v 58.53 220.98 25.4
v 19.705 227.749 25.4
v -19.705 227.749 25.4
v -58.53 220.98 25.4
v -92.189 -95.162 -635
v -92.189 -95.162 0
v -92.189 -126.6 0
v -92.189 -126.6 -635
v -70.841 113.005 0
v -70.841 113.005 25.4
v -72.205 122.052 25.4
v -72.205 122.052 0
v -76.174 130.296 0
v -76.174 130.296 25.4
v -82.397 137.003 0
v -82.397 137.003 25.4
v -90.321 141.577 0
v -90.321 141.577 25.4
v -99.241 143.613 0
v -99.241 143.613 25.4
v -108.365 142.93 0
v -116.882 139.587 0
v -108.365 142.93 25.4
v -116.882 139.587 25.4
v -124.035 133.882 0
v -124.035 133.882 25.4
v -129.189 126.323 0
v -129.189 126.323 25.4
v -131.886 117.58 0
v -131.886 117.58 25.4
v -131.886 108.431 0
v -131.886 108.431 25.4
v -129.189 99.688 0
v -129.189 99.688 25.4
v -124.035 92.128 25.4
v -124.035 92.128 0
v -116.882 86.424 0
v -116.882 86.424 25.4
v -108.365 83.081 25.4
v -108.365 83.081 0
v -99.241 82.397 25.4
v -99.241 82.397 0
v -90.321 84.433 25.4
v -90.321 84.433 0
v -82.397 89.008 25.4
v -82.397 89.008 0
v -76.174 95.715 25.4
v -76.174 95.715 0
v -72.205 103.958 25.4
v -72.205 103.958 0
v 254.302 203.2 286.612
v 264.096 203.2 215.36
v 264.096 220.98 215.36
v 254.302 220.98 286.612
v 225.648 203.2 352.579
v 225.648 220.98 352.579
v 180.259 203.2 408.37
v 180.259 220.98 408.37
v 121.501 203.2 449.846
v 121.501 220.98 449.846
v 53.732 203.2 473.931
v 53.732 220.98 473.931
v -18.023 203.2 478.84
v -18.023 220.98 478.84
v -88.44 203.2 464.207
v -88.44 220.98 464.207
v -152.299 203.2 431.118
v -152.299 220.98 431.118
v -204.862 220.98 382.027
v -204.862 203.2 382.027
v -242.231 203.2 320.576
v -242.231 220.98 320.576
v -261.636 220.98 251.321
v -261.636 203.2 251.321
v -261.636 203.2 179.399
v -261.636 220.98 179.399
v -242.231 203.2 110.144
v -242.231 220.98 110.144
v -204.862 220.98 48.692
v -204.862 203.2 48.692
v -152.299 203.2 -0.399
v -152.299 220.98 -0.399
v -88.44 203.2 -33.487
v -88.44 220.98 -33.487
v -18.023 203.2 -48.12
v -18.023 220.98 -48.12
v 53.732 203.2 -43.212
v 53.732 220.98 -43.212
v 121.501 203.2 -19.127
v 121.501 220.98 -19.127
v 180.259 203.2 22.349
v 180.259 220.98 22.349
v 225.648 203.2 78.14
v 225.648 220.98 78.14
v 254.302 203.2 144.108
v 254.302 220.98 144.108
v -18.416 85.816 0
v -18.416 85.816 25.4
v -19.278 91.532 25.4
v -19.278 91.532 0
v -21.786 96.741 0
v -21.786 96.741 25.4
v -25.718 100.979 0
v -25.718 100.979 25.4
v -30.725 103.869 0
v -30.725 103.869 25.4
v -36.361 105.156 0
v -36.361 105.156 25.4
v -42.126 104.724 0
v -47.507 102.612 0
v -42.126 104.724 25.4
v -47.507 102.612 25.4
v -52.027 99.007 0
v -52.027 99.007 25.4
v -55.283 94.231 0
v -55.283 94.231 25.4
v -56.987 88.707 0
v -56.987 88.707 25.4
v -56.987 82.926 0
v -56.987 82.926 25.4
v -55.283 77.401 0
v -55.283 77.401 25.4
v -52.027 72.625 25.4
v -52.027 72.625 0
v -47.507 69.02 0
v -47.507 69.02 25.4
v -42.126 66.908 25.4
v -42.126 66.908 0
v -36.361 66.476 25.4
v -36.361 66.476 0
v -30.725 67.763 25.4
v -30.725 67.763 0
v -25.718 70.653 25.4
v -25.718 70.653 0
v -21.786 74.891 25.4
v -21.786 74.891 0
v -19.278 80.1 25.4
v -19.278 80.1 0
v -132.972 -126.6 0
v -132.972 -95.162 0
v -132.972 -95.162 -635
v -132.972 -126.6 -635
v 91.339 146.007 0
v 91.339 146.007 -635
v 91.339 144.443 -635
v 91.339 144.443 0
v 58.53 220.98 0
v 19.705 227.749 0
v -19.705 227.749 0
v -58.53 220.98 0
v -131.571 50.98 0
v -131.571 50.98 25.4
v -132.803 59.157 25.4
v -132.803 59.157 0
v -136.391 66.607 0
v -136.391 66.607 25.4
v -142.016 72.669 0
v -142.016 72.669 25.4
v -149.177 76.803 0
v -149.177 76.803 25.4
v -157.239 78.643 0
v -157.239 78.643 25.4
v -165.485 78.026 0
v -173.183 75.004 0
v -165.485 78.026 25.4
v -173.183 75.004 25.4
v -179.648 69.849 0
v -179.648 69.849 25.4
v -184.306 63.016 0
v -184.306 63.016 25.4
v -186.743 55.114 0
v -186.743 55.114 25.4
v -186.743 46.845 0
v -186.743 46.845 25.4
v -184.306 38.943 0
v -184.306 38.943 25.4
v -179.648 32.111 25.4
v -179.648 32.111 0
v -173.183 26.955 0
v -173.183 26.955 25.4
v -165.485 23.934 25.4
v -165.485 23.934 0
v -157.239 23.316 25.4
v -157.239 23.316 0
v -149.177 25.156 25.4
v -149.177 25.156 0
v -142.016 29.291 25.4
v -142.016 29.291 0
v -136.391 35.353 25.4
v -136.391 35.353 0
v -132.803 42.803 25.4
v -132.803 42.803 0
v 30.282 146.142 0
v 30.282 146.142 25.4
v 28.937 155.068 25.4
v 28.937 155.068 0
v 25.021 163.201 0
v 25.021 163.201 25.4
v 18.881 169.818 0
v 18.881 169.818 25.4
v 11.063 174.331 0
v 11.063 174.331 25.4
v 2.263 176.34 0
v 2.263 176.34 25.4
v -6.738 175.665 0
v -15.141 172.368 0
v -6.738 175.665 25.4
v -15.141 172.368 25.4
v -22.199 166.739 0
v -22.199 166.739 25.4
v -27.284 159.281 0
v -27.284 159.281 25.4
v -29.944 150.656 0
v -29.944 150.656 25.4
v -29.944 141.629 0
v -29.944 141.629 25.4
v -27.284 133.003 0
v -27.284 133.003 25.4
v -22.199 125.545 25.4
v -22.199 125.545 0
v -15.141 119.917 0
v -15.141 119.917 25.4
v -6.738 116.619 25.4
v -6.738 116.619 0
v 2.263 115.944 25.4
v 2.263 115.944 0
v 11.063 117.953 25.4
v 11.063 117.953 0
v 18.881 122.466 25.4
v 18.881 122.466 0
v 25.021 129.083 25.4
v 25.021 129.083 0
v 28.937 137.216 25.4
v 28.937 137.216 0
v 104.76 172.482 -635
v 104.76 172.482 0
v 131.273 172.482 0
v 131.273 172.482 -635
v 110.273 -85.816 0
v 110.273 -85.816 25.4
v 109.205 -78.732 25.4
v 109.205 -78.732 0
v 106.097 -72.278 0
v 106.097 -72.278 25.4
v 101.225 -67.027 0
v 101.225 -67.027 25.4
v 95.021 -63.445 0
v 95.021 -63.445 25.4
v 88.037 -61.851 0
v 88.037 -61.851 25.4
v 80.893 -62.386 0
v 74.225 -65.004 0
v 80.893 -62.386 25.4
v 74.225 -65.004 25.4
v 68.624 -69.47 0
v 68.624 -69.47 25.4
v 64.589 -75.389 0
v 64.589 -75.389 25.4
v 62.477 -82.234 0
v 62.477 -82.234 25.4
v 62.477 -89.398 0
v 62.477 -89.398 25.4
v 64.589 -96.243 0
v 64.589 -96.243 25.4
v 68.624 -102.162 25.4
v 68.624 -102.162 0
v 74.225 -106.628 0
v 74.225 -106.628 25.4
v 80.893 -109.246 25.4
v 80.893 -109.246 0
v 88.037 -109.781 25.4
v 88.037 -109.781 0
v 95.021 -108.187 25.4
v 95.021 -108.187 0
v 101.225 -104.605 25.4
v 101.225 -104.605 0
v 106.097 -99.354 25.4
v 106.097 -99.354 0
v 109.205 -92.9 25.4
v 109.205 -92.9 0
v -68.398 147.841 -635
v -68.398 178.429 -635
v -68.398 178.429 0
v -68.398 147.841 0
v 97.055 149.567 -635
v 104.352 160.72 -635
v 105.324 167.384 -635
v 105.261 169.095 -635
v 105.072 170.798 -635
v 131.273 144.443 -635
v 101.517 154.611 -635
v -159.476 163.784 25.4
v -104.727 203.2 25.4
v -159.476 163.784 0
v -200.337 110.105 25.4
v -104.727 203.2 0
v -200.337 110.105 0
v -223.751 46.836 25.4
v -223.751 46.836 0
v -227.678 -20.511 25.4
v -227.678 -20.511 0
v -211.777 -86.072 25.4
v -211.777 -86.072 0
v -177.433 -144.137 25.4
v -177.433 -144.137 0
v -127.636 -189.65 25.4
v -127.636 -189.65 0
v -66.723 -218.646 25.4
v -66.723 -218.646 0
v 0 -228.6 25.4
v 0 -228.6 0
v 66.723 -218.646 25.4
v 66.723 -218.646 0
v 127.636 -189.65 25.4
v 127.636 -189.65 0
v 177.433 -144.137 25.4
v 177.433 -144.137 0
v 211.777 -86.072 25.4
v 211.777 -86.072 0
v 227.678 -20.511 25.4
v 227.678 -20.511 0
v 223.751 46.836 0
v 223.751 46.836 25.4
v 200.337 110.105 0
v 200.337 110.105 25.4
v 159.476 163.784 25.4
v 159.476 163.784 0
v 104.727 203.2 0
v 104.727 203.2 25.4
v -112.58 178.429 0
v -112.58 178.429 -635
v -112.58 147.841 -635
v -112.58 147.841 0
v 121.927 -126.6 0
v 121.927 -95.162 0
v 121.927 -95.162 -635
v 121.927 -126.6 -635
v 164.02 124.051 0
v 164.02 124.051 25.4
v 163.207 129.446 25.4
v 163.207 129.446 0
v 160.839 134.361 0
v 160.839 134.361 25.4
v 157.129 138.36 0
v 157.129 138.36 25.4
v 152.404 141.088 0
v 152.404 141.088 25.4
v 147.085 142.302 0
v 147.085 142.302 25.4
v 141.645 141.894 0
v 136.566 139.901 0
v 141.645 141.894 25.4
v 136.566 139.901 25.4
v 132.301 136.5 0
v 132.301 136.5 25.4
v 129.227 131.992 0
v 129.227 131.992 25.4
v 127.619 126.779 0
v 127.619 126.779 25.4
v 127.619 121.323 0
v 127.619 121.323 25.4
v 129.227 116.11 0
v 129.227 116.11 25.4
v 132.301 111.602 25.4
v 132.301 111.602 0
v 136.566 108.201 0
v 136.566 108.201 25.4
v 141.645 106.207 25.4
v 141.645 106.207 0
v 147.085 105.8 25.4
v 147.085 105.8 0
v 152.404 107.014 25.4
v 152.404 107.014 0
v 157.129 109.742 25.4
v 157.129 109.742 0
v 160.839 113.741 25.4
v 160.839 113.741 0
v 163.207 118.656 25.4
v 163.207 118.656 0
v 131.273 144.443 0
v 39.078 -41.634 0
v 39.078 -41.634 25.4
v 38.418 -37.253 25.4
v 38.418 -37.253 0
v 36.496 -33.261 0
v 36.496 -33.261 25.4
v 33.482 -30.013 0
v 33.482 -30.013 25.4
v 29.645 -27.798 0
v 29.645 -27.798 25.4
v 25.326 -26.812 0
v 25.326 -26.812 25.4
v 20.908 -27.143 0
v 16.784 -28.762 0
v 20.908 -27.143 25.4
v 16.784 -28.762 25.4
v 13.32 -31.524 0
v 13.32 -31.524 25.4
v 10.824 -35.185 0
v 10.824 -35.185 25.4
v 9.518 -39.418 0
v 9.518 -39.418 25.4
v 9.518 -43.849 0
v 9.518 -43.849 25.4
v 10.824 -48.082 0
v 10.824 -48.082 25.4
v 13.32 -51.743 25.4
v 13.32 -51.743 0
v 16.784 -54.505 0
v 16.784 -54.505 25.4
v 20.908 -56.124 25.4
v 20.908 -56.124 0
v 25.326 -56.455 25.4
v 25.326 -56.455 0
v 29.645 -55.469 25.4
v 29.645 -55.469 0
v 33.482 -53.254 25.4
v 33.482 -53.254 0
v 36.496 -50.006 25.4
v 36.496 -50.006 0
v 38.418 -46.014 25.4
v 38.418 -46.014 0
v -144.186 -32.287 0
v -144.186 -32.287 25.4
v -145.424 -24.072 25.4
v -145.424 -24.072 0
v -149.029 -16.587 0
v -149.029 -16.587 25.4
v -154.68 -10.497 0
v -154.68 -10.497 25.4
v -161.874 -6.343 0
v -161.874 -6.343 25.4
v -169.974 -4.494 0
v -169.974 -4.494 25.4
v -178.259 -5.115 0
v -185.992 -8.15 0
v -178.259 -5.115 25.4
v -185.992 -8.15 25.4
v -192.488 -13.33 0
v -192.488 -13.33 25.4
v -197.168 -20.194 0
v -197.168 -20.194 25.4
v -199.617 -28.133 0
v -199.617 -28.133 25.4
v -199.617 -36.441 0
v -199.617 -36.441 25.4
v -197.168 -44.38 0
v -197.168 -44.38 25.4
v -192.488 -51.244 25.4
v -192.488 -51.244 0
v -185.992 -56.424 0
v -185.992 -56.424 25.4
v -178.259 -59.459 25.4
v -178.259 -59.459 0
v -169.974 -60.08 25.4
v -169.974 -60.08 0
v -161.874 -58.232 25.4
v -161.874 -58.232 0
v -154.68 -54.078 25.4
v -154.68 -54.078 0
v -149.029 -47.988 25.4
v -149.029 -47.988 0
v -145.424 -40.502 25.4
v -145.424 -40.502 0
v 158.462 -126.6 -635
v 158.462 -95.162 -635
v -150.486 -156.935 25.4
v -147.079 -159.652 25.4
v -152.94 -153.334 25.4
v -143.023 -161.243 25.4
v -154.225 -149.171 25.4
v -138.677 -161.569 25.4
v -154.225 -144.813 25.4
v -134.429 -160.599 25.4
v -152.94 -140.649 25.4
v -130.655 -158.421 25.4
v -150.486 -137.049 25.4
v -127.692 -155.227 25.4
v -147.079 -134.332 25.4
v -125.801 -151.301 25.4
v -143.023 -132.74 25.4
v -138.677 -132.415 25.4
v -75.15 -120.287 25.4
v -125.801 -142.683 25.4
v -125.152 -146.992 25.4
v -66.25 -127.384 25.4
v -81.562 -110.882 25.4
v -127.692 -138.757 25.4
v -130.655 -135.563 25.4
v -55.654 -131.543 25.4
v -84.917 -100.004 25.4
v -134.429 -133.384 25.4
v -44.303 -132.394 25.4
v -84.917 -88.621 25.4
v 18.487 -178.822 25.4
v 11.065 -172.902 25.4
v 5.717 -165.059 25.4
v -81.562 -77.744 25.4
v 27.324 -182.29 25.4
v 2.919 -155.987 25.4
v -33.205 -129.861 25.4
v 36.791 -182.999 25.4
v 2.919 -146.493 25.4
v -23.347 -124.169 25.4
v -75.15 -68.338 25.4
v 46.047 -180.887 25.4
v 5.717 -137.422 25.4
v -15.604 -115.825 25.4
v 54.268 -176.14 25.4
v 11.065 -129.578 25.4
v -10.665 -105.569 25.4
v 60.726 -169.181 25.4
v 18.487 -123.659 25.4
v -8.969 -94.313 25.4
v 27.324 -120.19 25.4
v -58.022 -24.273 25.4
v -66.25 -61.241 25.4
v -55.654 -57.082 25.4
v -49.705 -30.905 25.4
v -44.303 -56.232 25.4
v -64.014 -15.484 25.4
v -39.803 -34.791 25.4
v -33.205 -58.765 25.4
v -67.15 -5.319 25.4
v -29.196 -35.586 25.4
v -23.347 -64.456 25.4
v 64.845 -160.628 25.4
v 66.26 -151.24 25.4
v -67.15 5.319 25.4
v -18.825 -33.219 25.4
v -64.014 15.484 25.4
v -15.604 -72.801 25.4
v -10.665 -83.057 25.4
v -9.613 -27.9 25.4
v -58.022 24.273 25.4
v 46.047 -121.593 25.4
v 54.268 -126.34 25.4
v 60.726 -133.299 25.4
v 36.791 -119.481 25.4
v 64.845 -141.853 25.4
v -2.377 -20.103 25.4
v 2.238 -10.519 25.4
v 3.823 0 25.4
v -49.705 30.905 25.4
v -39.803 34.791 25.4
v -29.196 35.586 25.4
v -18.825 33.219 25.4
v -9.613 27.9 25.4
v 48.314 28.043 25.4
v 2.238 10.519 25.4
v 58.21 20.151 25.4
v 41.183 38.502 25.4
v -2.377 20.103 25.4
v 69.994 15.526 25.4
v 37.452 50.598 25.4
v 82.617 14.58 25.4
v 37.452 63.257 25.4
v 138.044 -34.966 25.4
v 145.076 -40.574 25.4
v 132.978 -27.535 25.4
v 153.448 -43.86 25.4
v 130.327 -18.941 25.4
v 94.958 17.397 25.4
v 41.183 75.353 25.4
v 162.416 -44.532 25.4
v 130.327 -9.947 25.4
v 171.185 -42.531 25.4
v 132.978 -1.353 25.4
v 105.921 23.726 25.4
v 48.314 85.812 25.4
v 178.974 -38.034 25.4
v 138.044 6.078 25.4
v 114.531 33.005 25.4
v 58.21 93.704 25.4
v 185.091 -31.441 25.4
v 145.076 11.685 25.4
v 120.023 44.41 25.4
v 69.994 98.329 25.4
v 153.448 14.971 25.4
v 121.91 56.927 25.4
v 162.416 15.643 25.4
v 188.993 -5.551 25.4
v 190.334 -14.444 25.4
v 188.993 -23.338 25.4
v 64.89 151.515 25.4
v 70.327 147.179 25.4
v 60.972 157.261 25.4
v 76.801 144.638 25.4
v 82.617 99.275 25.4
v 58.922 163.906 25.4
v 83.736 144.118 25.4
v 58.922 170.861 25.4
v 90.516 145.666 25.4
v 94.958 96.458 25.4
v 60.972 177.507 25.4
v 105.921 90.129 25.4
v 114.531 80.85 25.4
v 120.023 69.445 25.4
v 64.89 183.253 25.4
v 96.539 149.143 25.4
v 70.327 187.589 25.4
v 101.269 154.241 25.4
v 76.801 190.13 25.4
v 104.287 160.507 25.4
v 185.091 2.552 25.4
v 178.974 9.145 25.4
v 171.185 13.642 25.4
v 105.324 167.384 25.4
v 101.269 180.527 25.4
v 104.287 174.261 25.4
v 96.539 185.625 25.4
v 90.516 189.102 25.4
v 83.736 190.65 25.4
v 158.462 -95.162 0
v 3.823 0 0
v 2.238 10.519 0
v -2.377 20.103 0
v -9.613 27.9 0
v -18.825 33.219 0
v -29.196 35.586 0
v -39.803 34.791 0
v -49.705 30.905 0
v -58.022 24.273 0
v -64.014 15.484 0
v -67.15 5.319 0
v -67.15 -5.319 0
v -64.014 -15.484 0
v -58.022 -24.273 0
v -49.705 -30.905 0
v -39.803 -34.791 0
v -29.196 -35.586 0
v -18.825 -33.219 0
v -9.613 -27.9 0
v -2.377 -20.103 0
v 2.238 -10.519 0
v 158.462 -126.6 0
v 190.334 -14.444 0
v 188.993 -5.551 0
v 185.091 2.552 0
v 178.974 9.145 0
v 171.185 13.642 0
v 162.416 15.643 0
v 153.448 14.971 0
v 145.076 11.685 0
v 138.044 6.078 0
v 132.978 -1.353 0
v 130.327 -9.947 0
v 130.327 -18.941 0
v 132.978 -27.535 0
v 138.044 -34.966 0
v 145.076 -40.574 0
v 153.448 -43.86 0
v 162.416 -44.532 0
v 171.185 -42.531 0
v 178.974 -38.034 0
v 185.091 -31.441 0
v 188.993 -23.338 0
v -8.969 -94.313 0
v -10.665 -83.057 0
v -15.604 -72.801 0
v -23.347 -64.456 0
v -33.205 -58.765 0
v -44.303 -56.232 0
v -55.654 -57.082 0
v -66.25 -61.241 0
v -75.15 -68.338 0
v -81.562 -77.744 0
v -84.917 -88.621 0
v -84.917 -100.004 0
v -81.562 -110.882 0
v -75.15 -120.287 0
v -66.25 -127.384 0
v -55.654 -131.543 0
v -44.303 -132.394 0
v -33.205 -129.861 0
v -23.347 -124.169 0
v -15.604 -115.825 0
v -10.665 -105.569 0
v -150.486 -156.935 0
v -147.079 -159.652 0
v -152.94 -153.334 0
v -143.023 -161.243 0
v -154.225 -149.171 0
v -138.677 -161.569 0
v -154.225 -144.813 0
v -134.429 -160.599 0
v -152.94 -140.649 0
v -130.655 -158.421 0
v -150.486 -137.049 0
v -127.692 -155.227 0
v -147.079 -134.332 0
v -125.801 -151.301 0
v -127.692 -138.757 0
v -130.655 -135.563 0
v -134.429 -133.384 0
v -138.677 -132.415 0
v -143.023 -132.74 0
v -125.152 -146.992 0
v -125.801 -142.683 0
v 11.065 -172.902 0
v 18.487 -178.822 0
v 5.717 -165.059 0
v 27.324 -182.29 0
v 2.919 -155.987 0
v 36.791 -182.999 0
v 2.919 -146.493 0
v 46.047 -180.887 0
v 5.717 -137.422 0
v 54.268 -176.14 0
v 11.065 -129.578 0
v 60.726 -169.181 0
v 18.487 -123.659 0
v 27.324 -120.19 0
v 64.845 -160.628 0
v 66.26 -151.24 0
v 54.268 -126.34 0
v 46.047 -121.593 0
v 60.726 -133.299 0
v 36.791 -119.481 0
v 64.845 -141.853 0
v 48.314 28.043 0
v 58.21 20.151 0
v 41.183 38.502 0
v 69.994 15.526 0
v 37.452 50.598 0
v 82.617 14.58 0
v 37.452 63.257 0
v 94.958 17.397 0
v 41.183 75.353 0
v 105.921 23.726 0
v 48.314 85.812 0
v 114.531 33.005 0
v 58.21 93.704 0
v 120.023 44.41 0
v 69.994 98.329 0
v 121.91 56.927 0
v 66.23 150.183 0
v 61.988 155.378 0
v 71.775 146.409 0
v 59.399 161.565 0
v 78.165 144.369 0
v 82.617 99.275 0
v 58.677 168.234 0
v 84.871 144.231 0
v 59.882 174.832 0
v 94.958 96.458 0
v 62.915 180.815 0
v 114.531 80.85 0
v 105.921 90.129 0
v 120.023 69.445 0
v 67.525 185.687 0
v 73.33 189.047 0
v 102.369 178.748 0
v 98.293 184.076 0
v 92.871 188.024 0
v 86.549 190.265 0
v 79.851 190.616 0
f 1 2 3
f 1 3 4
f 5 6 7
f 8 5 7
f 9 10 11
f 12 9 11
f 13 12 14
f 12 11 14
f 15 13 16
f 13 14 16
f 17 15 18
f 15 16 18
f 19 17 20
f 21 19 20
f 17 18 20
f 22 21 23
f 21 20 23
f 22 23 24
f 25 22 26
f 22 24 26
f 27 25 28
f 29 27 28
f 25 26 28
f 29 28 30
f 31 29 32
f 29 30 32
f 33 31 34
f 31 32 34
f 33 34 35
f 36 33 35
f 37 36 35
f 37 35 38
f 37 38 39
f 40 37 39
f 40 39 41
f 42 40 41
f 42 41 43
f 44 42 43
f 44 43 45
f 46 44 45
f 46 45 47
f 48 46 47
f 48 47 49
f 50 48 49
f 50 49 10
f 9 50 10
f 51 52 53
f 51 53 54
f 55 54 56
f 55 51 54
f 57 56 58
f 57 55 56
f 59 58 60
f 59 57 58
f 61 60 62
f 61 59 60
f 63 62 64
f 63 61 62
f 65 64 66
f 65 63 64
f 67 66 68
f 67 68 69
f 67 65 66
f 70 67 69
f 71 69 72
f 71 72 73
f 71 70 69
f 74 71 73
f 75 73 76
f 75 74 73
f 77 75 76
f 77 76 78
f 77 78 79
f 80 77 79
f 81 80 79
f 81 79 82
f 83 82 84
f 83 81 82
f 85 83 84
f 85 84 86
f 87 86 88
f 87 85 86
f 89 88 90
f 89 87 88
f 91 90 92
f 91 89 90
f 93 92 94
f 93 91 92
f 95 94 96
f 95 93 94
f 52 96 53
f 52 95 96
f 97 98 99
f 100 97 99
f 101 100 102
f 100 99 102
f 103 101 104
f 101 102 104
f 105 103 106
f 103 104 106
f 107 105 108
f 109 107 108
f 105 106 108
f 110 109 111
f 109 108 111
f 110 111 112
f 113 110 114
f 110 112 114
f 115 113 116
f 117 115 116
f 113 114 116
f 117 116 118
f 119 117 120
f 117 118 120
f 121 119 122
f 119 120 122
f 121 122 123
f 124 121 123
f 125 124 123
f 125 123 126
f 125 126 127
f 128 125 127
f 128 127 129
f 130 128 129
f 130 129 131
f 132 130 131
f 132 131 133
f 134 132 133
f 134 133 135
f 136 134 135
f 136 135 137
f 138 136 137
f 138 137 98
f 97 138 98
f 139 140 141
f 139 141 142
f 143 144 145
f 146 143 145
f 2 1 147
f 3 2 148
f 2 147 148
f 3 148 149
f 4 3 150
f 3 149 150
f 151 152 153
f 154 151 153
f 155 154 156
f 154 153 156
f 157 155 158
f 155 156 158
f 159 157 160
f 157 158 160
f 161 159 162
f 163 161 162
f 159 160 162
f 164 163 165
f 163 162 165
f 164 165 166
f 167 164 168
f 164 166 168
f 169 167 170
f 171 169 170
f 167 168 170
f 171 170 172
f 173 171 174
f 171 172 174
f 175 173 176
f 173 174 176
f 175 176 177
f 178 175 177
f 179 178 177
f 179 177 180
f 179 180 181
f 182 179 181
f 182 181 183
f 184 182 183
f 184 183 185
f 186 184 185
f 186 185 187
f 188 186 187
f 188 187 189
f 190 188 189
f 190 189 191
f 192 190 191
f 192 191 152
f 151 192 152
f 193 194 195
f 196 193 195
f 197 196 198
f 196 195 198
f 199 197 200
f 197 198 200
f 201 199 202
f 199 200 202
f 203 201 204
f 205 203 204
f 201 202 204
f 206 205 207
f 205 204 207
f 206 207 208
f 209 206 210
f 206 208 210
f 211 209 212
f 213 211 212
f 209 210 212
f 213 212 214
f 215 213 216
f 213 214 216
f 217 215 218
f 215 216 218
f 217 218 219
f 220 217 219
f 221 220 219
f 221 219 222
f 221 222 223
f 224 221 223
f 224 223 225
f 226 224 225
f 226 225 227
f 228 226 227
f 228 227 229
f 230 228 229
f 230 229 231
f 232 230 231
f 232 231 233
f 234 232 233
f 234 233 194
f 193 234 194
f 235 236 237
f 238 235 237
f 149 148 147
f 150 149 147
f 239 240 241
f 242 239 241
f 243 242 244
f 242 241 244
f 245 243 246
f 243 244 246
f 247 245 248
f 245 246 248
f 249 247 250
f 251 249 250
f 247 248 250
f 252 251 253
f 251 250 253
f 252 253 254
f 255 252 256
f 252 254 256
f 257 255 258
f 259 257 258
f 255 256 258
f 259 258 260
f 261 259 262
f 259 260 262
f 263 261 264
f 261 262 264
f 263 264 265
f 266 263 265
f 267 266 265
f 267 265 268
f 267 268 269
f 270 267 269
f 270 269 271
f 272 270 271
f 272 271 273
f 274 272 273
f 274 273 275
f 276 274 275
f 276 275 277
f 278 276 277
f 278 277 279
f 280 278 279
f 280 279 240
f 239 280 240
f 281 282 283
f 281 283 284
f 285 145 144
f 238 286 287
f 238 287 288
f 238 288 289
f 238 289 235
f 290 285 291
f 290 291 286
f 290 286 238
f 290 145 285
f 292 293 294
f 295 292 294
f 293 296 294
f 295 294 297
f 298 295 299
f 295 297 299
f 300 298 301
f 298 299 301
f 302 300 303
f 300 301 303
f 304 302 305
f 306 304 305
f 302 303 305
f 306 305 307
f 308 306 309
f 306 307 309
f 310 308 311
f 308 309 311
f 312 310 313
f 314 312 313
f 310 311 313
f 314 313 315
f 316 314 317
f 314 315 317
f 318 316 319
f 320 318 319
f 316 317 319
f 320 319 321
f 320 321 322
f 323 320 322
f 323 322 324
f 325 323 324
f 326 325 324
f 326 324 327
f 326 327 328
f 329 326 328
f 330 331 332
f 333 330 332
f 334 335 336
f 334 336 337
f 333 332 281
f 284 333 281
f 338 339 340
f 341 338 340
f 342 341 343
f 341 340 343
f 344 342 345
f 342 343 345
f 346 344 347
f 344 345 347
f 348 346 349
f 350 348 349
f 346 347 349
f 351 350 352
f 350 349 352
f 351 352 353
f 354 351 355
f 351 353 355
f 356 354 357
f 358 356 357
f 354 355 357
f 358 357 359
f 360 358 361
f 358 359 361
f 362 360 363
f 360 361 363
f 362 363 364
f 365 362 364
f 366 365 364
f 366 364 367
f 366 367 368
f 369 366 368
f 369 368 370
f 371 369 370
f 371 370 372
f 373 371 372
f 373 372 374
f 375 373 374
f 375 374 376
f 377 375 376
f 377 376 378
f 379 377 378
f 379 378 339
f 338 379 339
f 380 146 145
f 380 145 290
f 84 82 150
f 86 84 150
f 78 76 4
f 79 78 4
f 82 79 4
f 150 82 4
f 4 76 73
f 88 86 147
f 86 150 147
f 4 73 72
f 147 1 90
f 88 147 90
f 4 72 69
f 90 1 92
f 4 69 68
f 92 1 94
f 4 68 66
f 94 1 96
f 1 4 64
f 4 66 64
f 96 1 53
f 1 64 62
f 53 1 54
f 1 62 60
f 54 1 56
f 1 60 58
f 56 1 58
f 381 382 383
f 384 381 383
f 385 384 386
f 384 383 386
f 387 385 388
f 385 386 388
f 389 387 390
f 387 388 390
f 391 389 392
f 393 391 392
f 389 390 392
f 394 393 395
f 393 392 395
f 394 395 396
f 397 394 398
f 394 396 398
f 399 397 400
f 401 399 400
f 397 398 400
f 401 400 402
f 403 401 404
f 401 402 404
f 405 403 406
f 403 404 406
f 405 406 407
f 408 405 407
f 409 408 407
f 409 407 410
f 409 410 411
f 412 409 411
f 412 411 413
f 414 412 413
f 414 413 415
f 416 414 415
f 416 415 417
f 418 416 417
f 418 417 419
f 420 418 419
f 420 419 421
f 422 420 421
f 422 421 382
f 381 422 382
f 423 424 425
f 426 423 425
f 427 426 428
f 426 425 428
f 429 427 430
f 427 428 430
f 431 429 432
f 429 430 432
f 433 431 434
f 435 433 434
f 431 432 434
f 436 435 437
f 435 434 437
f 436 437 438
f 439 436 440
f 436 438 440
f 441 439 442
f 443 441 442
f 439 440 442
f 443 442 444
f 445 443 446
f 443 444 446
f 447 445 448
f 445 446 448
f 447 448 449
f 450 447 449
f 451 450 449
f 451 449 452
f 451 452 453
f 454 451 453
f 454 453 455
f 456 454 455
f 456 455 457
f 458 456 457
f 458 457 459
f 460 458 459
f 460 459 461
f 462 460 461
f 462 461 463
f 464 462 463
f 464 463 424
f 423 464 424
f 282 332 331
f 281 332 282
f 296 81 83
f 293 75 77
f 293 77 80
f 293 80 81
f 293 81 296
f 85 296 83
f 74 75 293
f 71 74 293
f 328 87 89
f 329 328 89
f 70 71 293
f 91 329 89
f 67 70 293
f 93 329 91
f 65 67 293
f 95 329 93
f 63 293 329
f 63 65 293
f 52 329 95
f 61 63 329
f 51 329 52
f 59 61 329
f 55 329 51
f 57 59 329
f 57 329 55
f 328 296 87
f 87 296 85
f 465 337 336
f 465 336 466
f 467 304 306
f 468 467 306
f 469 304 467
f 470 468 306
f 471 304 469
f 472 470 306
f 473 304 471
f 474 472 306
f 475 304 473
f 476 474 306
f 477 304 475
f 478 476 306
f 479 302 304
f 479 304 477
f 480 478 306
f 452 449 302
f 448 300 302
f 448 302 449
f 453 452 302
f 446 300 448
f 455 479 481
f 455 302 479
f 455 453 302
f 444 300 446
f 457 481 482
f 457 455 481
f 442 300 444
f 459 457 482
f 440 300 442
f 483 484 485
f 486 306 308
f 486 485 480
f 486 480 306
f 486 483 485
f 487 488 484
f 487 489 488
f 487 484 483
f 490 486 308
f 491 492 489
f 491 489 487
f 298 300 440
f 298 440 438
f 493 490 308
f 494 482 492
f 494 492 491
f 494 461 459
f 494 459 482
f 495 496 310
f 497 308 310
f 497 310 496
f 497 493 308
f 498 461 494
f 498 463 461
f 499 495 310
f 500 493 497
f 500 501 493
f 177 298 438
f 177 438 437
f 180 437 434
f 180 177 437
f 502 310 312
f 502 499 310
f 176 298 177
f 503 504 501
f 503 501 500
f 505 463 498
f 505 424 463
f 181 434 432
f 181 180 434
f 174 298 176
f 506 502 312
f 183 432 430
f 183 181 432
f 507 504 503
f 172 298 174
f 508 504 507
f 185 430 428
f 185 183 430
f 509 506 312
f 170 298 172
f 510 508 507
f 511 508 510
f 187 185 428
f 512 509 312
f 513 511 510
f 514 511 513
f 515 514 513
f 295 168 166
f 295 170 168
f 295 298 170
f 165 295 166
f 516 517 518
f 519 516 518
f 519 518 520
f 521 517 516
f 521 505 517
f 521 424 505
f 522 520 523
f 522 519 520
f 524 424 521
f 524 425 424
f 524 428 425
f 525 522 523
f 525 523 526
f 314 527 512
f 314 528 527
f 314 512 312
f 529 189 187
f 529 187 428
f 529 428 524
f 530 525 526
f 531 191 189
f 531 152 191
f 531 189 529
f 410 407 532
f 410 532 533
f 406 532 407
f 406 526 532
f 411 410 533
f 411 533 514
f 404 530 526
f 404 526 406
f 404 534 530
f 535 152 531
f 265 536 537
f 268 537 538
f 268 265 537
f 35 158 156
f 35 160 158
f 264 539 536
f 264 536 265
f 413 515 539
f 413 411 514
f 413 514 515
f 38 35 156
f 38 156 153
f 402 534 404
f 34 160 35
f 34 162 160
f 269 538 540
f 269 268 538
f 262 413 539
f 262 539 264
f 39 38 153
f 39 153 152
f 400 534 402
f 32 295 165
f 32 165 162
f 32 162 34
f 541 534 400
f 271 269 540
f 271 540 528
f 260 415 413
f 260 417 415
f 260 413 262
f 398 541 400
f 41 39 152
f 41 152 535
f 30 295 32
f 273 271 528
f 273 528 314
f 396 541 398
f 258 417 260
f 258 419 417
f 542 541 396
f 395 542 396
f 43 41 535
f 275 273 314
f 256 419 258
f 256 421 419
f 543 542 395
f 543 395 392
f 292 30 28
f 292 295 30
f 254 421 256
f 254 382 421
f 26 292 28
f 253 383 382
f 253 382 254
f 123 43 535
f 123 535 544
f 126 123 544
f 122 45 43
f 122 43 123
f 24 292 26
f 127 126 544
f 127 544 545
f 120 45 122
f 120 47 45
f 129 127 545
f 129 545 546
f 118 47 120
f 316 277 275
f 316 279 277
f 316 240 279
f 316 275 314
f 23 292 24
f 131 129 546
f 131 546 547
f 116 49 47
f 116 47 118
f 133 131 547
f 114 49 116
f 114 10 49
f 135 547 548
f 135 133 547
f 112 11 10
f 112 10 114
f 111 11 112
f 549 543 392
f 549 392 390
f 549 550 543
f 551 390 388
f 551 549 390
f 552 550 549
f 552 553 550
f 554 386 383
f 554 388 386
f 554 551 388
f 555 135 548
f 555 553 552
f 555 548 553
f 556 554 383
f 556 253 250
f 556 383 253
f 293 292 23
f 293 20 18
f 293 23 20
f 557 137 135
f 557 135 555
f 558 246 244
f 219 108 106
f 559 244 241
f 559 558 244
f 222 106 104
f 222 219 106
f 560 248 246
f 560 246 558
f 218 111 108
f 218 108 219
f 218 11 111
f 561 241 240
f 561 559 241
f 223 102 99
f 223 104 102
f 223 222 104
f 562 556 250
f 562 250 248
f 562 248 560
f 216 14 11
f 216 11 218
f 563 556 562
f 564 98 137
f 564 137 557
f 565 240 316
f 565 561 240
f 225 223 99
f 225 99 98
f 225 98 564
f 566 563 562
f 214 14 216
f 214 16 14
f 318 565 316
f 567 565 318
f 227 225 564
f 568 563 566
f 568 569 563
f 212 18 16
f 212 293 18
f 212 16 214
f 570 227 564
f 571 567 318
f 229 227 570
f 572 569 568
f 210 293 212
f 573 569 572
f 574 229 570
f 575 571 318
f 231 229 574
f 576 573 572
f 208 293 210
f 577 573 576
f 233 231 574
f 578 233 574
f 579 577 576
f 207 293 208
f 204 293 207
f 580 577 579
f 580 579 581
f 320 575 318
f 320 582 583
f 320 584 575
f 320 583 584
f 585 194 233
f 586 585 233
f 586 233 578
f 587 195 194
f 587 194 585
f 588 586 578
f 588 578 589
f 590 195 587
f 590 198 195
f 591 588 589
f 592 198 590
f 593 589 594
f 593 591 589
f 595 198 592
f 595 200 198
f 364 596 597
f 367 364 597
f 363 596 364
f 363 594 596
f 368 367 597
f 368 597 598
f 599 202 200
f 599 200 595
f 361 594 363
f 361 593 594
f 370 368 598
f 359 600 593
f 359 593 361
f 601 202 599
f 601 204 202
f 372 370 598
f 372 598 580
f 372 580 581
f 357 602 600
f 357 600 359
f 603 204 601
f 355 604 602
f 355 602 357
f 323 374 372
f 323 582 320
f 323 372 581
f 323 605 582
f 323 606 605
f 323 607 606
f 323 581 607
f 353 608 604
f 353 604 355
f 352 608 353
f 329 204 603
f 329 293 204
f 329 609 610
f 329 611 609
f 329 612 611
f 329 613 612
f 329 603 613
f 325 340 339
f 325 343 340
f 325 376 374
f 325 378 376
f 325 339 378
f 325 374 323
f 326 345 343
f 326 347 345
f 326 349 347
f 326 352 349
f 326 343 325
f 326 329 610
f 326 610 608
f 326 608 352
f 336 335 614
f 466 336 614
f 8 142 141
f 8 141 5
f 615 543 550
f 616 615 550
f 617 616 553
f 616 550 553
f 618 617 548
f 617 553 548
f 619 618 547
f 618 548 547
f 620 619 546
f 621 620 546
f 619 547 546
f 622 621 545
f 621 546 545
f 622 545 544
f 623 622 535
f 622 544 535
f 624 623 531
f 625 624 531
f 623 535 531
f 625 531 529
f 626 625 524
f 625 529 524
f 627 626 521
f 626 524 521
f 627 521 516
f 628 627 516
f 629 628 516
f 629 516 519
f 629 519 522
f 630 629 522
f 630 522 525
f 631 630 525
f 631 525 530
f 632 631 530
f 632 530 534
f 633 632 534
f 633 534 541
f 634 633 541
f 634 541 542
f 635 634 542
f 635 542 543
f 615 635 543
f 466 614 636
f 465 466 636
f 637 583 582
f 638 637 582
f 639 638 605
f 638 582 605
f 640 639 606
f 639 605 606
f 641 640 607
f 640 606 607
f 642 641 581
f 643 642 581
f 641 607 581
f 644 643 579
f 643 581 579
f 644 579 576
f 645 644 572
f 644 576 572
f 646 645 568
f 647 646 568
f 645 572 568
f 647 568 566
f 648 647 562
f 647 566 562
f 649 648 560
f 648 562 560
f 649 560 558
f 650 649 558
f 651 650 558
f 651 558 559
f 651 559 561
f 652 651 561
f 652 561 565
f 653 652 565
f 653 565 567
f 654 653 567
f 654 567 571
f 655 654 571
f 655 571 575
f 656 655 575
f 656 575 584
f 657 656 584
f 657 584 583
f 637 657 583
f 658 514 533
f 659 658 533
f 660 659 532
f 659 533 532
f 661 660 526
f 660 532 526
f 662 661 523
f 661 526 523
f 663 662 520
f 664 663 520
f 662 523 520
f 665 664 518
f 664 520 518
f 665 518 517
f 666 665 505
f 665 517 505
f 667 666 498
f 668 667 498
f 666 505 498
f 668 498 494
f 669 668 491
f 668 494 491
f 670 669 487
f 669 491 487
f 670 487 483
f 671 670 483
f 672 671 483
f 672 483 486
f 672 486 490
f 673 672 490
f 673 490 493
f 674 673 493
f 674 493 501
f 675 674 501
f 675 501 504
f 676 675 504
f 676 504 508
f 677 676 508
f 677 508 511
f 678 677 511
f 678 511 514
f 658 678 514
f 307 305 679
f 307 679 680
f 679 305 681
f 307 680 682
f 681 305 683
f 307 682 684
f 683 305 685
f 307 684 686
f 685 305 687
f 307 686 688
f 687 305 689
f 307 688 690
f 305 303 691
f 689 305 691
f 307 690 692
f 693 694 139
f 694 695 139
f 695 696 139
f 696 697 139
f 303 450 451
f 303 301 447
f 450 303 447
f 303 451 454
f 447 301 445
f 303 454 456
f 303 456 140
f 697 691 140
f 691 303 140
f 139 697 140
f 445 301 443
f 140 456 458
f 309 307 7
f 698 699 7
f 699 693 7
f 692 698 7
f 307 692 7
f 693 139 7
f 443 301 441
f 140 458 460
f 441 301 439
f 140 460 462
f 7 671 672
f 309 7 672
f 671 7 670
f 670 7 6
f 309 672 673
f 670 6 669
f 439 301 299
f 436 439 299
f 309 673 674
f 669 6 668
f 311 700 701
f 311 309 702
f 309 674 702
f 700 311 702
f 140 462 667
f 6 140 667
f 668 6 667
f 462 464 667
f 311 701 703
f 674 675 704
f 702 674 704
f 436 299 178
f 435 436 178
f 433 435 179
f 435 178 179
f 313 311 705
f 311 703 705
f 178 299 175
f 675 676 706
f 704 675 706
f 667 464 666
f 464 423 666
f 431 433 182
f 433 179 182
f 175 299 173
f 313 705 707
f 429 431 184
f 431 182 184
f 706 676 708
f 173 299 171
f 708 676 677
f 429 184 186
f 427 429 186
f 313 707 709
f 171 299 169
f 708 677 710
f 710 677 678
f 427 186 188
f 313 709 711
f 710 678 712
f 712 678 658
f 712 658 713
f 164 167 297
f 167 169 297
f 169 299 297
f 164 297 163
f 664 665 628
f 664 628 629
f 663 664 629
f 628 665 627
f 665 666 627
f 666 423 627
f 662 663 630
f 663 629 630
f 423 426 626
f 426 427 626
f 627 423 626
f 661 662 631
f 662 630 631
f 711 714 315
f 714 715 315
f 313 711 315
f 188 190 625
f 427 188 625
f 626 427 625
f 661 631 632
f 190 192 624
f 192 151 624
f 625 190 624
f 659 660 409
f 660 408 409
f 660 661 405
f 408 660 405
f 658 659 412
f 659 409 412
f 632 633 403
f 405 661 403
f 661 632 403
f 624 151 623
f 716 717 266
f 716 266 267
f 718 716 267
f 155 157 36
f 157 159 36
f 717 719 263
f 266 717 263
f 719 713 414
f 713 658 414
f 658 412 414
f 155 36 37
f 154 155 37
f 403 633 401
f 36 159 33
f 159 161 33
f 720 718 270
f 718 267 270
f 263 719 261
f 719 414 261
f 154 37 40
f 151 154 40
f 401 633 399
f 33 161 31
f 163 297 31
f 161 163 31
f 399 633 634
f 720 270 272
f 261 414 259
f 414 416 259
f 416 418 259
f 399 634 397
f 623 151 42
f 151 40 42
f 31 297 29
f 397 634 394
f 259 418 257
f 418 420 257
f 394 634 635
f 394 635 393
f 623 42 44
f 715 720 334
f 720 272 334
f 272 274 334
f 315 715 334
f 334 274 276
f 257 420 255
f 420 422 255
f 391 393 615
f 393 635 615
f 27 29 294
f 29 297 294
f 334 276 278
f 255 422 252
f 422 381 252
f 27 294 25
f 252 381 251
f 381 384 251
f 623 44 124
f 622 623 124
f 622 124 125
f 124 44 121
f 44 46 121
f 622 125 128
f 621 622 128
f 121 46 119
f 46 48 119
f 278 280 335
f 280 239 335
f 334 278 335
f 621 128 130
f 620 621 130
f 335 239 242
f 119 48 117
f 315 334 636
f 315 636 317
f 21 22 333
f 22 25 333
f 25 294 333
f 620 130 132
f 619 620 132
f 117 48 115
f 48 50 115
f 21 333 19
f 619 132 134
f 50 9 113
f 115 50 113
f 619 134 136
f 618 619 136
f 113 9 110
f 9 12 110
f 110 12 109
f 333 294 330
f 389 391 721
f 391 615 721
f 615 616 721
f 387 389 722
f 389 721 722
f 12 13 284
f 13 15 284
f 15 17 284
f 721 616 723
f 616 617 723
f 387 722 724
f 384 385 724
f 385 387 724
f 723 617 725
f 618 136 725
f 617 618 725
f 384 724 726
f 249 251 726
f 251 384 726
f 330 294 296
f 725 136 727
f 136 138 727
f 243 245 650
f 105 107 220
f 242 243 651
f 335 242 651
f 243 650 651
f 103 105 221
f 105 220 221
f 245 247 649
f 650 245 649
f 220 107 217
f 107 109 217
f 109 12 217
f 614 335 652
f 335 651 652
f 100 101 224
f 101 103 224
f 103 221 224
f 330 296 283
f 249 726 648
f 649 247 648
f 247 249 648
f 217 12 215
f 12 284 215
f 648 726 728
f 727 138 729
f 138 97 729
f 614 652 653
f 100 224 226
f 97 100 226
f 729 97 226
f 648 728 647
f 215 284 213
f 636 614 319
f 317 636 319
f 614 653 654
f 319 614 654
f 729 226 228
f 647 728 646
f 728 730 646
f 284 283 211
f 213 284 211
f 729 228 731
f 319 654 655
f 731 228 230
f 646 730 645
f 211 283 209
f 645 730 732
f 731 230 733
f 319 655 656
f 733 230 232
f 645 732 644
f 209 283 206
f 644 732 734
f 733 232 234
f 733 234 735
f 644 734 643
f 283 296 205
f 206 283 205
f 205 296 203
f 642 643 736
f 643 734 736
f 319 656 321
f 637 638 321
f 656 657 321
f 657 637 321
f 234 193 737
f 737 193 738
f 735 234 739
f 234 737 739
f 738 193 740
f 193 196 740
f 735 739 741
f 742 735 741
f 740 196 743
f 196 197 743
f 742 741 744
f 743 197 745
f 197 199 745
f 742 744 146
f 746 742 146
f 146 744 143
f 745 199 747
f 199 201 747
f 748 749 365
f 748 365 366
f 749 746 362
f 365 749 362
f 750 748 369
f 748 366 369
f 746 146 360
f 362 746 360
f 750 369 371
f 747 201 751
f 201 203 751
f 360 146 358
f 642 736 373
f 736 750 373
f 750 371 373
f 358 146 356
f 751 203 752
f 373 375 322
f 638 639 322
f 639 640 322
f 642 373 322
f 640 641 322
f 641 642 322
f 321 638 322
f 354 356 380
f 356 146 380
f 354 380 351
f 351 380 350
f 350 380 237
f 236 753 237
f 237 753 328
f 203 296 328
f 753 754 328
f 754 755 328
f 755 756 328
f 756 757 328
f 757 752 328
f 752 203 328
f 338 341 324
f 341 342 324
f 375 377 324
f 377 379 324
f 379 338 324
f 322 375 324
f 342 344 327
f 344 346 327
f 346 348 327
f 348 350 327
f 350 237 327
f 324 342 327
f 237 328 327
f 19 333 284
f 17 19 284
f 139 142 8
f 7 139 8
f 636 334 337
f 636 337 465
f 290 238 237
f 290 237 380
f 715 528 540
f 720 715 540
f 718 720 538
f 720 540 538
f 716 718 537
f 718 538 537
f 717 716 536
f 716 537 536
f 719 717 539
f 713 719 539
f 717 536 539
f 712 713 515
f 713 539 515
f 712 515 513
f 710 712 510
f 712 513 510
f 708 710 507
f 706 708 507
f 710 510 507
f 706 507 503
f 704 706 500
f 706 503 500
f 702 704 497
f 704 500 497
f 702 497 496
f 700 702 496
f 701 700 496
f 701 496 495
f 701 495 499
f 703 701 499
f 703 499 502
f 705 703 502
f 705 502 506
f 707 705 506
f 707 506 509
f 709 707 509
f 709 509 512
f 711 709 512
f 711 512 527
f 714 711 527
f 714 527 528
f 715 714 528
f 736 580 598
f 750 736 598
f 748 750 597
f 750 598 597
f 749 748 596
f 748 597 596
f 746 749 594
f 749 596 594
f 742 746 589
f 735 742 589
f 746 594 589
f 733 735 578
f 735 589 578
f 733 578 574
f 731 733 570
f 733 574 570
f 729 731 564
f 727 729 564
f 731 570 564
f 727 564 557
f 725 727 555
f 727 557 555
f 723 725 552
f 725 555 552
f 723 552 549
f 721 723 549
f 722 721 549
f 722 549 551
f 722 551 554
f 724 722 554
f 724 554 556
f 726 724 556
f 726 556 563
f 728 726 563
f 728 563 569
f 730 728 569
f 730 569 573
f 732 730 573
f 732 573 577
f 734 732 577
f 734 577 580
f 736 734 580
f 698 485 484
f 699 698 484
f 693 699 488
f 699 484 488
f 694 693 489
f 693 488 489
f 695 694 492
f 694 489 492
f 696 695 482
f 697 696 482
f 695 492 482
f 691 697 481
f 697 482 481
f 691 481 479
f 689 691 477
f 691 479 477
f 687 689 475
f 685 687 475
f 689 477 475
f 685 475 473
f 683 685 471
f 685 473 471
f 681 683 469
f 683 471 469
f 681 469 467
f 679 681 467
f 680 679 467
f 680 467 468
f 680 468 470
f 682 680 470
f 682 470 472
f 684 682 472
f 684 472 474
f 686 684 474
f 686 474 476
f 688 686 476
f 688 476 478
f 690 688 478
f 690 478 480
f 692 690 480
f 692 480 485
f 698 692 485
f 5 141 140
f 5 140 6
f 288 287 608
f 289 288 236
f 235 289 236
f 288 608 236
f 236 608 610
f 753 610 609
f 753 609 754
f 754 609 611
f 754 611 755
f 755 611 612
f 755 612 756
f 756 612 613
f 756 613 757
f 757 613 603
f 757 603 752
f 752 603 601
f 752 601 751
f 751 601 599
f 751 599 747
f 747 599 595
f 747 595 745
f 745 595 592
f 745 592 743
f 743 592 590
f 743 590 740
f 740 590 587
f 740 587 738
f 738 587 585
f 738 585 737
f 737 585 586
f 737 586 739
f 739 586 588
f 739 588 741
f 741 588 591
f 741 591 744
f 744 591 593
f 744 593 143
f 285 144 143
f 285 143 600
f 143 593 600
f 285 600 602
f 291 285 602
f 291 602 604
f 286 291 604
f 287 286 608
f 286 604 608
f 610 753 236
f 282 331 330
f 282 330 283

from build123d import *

# Parameters (mm, degrees)
F0_R     = 228.6
F1_DEPTH = 25.4
F2_W     = 40.7838597894
F2_H     = 31.4375534654
F2_W_2   = 36.5355312824
F2_W_3   = 39.9341955781
F2_H_2   = 28.0388891697
F2_W_4   = 44.1825091839
F2_H_3   = 30.5878967047
F3_DEPTH = 635
F4_R     = 27.7412270748
F4_R_2   = 30.6939197936
F4_R_3   = 30.2824794864
F4_R_4   = 42.4661928604
F4_R_5   = 35.685878247
F4_R_6   = 24.0321224842
F4_R_7   = 38.1876319
F4_R_8   = 27.8710420507
F4_R_9   = 30.1720485084
F4_R_10  = 18.3023272337
F4_R_11  = 31.8482226346
F4_R_12  = 14.6181758263
F4_R_13  = 14.8630451227
F4_R_14  = 19.3939328546
F4_R_15  = 23.3309809272
F5_DEPTH = 977.9
F7_START = -203.2
F6_R     = 264.0955993442
F7_DEPTH = 17.78


with BuildPart() as f1:
    # F0 (on Top) → F1 (new body)
    with BuildSketch(Plane.XY):
        Circle(F0_R)
    extrude(amount=F1_DEPTH)

    # F2 (on face) → F3 (join)
    with BuildSketch(Plane(origin=(0, 0, 0), x_dir=(1, 0, 0), z_dir=(0, 0, -1))):
        with Locations((-112.5804446638, 110.8811162412)):
            Rectangle(F2_W, F2_H)
        with Locations((140.1945054531, 110.8811162412)):
            Rectangle(F2_W_2, F2_H)
        with Locations((111.3059483469, -158.4622859955)):
            Rectangle(F2_W_3, F2_H_2)
        with Locations((-90.4891863465, -163.1354317069)):
            Rectangle(F2_W_4, F2_H_3)
    extrude(amount=F3_DEPTH)

    # F4 (on face) → F5 (cut)
    with BuildSketch(Plane.XY.offset(25.4)):
        with Locations((-159.3119651079, 50.9798228741)):
            Circle(F4_R)
        with Locations((-101.5348359942, 113.0052730441)):
            Circle(F4_R_2)
        with Locations((0, 146.142154932)):
            Circle(F4_R_3)
        with Locations((79.4435366988, 56.9274686277)):
            Circle(F4_R_4)
        with Locations((-31.8624041975, 0)):
            Circle(F4_R_5)
        with Locations((86.240850389, -85.8160331845)):
            Circle(F4_R_6)
        with Locations((-47.1563488245, -94.3126752973)):
            Circle(F4_R_7)
        with Locations((-172.0569133759, -32.2872214019)):
            Circle(F4_R_8)
        with Locations((160.1615846157, -14.4442841411)):
            Circle(F4_R_9)
        with Locations((145.7173079252, 124.0509077907)):
            Circle(F4_R_10)
        with Locations((34.4113633037, -151.2401401997)):
            Circle(F4_R_11)
        with Locations((-139.7697031498, -146.9918191433)):
            Circle(F4_R_12)
        with Locations((24.215400219, -41.6335240006)):
            Circle(F4_R_13)
        with Locations((-37.8100499511, 85.8160331845)):
            Circle(F4_R_14)
        with Locations((81.9925293326, 167.3837602139)):
            Circle(F4_R_15)
    extrude(amount=-F5_DEPTH, mode=Mode.SUBTRACT)

    # F6 (on Front) → F7 (join)
    with BuildSketch(Plane.XZ.offset(F7_START)):
        with Locations((0, 215.3596431017)):
            Circle(F6_R)
    extrude(amount=-F7_DEPTH)


solid = f1.part
